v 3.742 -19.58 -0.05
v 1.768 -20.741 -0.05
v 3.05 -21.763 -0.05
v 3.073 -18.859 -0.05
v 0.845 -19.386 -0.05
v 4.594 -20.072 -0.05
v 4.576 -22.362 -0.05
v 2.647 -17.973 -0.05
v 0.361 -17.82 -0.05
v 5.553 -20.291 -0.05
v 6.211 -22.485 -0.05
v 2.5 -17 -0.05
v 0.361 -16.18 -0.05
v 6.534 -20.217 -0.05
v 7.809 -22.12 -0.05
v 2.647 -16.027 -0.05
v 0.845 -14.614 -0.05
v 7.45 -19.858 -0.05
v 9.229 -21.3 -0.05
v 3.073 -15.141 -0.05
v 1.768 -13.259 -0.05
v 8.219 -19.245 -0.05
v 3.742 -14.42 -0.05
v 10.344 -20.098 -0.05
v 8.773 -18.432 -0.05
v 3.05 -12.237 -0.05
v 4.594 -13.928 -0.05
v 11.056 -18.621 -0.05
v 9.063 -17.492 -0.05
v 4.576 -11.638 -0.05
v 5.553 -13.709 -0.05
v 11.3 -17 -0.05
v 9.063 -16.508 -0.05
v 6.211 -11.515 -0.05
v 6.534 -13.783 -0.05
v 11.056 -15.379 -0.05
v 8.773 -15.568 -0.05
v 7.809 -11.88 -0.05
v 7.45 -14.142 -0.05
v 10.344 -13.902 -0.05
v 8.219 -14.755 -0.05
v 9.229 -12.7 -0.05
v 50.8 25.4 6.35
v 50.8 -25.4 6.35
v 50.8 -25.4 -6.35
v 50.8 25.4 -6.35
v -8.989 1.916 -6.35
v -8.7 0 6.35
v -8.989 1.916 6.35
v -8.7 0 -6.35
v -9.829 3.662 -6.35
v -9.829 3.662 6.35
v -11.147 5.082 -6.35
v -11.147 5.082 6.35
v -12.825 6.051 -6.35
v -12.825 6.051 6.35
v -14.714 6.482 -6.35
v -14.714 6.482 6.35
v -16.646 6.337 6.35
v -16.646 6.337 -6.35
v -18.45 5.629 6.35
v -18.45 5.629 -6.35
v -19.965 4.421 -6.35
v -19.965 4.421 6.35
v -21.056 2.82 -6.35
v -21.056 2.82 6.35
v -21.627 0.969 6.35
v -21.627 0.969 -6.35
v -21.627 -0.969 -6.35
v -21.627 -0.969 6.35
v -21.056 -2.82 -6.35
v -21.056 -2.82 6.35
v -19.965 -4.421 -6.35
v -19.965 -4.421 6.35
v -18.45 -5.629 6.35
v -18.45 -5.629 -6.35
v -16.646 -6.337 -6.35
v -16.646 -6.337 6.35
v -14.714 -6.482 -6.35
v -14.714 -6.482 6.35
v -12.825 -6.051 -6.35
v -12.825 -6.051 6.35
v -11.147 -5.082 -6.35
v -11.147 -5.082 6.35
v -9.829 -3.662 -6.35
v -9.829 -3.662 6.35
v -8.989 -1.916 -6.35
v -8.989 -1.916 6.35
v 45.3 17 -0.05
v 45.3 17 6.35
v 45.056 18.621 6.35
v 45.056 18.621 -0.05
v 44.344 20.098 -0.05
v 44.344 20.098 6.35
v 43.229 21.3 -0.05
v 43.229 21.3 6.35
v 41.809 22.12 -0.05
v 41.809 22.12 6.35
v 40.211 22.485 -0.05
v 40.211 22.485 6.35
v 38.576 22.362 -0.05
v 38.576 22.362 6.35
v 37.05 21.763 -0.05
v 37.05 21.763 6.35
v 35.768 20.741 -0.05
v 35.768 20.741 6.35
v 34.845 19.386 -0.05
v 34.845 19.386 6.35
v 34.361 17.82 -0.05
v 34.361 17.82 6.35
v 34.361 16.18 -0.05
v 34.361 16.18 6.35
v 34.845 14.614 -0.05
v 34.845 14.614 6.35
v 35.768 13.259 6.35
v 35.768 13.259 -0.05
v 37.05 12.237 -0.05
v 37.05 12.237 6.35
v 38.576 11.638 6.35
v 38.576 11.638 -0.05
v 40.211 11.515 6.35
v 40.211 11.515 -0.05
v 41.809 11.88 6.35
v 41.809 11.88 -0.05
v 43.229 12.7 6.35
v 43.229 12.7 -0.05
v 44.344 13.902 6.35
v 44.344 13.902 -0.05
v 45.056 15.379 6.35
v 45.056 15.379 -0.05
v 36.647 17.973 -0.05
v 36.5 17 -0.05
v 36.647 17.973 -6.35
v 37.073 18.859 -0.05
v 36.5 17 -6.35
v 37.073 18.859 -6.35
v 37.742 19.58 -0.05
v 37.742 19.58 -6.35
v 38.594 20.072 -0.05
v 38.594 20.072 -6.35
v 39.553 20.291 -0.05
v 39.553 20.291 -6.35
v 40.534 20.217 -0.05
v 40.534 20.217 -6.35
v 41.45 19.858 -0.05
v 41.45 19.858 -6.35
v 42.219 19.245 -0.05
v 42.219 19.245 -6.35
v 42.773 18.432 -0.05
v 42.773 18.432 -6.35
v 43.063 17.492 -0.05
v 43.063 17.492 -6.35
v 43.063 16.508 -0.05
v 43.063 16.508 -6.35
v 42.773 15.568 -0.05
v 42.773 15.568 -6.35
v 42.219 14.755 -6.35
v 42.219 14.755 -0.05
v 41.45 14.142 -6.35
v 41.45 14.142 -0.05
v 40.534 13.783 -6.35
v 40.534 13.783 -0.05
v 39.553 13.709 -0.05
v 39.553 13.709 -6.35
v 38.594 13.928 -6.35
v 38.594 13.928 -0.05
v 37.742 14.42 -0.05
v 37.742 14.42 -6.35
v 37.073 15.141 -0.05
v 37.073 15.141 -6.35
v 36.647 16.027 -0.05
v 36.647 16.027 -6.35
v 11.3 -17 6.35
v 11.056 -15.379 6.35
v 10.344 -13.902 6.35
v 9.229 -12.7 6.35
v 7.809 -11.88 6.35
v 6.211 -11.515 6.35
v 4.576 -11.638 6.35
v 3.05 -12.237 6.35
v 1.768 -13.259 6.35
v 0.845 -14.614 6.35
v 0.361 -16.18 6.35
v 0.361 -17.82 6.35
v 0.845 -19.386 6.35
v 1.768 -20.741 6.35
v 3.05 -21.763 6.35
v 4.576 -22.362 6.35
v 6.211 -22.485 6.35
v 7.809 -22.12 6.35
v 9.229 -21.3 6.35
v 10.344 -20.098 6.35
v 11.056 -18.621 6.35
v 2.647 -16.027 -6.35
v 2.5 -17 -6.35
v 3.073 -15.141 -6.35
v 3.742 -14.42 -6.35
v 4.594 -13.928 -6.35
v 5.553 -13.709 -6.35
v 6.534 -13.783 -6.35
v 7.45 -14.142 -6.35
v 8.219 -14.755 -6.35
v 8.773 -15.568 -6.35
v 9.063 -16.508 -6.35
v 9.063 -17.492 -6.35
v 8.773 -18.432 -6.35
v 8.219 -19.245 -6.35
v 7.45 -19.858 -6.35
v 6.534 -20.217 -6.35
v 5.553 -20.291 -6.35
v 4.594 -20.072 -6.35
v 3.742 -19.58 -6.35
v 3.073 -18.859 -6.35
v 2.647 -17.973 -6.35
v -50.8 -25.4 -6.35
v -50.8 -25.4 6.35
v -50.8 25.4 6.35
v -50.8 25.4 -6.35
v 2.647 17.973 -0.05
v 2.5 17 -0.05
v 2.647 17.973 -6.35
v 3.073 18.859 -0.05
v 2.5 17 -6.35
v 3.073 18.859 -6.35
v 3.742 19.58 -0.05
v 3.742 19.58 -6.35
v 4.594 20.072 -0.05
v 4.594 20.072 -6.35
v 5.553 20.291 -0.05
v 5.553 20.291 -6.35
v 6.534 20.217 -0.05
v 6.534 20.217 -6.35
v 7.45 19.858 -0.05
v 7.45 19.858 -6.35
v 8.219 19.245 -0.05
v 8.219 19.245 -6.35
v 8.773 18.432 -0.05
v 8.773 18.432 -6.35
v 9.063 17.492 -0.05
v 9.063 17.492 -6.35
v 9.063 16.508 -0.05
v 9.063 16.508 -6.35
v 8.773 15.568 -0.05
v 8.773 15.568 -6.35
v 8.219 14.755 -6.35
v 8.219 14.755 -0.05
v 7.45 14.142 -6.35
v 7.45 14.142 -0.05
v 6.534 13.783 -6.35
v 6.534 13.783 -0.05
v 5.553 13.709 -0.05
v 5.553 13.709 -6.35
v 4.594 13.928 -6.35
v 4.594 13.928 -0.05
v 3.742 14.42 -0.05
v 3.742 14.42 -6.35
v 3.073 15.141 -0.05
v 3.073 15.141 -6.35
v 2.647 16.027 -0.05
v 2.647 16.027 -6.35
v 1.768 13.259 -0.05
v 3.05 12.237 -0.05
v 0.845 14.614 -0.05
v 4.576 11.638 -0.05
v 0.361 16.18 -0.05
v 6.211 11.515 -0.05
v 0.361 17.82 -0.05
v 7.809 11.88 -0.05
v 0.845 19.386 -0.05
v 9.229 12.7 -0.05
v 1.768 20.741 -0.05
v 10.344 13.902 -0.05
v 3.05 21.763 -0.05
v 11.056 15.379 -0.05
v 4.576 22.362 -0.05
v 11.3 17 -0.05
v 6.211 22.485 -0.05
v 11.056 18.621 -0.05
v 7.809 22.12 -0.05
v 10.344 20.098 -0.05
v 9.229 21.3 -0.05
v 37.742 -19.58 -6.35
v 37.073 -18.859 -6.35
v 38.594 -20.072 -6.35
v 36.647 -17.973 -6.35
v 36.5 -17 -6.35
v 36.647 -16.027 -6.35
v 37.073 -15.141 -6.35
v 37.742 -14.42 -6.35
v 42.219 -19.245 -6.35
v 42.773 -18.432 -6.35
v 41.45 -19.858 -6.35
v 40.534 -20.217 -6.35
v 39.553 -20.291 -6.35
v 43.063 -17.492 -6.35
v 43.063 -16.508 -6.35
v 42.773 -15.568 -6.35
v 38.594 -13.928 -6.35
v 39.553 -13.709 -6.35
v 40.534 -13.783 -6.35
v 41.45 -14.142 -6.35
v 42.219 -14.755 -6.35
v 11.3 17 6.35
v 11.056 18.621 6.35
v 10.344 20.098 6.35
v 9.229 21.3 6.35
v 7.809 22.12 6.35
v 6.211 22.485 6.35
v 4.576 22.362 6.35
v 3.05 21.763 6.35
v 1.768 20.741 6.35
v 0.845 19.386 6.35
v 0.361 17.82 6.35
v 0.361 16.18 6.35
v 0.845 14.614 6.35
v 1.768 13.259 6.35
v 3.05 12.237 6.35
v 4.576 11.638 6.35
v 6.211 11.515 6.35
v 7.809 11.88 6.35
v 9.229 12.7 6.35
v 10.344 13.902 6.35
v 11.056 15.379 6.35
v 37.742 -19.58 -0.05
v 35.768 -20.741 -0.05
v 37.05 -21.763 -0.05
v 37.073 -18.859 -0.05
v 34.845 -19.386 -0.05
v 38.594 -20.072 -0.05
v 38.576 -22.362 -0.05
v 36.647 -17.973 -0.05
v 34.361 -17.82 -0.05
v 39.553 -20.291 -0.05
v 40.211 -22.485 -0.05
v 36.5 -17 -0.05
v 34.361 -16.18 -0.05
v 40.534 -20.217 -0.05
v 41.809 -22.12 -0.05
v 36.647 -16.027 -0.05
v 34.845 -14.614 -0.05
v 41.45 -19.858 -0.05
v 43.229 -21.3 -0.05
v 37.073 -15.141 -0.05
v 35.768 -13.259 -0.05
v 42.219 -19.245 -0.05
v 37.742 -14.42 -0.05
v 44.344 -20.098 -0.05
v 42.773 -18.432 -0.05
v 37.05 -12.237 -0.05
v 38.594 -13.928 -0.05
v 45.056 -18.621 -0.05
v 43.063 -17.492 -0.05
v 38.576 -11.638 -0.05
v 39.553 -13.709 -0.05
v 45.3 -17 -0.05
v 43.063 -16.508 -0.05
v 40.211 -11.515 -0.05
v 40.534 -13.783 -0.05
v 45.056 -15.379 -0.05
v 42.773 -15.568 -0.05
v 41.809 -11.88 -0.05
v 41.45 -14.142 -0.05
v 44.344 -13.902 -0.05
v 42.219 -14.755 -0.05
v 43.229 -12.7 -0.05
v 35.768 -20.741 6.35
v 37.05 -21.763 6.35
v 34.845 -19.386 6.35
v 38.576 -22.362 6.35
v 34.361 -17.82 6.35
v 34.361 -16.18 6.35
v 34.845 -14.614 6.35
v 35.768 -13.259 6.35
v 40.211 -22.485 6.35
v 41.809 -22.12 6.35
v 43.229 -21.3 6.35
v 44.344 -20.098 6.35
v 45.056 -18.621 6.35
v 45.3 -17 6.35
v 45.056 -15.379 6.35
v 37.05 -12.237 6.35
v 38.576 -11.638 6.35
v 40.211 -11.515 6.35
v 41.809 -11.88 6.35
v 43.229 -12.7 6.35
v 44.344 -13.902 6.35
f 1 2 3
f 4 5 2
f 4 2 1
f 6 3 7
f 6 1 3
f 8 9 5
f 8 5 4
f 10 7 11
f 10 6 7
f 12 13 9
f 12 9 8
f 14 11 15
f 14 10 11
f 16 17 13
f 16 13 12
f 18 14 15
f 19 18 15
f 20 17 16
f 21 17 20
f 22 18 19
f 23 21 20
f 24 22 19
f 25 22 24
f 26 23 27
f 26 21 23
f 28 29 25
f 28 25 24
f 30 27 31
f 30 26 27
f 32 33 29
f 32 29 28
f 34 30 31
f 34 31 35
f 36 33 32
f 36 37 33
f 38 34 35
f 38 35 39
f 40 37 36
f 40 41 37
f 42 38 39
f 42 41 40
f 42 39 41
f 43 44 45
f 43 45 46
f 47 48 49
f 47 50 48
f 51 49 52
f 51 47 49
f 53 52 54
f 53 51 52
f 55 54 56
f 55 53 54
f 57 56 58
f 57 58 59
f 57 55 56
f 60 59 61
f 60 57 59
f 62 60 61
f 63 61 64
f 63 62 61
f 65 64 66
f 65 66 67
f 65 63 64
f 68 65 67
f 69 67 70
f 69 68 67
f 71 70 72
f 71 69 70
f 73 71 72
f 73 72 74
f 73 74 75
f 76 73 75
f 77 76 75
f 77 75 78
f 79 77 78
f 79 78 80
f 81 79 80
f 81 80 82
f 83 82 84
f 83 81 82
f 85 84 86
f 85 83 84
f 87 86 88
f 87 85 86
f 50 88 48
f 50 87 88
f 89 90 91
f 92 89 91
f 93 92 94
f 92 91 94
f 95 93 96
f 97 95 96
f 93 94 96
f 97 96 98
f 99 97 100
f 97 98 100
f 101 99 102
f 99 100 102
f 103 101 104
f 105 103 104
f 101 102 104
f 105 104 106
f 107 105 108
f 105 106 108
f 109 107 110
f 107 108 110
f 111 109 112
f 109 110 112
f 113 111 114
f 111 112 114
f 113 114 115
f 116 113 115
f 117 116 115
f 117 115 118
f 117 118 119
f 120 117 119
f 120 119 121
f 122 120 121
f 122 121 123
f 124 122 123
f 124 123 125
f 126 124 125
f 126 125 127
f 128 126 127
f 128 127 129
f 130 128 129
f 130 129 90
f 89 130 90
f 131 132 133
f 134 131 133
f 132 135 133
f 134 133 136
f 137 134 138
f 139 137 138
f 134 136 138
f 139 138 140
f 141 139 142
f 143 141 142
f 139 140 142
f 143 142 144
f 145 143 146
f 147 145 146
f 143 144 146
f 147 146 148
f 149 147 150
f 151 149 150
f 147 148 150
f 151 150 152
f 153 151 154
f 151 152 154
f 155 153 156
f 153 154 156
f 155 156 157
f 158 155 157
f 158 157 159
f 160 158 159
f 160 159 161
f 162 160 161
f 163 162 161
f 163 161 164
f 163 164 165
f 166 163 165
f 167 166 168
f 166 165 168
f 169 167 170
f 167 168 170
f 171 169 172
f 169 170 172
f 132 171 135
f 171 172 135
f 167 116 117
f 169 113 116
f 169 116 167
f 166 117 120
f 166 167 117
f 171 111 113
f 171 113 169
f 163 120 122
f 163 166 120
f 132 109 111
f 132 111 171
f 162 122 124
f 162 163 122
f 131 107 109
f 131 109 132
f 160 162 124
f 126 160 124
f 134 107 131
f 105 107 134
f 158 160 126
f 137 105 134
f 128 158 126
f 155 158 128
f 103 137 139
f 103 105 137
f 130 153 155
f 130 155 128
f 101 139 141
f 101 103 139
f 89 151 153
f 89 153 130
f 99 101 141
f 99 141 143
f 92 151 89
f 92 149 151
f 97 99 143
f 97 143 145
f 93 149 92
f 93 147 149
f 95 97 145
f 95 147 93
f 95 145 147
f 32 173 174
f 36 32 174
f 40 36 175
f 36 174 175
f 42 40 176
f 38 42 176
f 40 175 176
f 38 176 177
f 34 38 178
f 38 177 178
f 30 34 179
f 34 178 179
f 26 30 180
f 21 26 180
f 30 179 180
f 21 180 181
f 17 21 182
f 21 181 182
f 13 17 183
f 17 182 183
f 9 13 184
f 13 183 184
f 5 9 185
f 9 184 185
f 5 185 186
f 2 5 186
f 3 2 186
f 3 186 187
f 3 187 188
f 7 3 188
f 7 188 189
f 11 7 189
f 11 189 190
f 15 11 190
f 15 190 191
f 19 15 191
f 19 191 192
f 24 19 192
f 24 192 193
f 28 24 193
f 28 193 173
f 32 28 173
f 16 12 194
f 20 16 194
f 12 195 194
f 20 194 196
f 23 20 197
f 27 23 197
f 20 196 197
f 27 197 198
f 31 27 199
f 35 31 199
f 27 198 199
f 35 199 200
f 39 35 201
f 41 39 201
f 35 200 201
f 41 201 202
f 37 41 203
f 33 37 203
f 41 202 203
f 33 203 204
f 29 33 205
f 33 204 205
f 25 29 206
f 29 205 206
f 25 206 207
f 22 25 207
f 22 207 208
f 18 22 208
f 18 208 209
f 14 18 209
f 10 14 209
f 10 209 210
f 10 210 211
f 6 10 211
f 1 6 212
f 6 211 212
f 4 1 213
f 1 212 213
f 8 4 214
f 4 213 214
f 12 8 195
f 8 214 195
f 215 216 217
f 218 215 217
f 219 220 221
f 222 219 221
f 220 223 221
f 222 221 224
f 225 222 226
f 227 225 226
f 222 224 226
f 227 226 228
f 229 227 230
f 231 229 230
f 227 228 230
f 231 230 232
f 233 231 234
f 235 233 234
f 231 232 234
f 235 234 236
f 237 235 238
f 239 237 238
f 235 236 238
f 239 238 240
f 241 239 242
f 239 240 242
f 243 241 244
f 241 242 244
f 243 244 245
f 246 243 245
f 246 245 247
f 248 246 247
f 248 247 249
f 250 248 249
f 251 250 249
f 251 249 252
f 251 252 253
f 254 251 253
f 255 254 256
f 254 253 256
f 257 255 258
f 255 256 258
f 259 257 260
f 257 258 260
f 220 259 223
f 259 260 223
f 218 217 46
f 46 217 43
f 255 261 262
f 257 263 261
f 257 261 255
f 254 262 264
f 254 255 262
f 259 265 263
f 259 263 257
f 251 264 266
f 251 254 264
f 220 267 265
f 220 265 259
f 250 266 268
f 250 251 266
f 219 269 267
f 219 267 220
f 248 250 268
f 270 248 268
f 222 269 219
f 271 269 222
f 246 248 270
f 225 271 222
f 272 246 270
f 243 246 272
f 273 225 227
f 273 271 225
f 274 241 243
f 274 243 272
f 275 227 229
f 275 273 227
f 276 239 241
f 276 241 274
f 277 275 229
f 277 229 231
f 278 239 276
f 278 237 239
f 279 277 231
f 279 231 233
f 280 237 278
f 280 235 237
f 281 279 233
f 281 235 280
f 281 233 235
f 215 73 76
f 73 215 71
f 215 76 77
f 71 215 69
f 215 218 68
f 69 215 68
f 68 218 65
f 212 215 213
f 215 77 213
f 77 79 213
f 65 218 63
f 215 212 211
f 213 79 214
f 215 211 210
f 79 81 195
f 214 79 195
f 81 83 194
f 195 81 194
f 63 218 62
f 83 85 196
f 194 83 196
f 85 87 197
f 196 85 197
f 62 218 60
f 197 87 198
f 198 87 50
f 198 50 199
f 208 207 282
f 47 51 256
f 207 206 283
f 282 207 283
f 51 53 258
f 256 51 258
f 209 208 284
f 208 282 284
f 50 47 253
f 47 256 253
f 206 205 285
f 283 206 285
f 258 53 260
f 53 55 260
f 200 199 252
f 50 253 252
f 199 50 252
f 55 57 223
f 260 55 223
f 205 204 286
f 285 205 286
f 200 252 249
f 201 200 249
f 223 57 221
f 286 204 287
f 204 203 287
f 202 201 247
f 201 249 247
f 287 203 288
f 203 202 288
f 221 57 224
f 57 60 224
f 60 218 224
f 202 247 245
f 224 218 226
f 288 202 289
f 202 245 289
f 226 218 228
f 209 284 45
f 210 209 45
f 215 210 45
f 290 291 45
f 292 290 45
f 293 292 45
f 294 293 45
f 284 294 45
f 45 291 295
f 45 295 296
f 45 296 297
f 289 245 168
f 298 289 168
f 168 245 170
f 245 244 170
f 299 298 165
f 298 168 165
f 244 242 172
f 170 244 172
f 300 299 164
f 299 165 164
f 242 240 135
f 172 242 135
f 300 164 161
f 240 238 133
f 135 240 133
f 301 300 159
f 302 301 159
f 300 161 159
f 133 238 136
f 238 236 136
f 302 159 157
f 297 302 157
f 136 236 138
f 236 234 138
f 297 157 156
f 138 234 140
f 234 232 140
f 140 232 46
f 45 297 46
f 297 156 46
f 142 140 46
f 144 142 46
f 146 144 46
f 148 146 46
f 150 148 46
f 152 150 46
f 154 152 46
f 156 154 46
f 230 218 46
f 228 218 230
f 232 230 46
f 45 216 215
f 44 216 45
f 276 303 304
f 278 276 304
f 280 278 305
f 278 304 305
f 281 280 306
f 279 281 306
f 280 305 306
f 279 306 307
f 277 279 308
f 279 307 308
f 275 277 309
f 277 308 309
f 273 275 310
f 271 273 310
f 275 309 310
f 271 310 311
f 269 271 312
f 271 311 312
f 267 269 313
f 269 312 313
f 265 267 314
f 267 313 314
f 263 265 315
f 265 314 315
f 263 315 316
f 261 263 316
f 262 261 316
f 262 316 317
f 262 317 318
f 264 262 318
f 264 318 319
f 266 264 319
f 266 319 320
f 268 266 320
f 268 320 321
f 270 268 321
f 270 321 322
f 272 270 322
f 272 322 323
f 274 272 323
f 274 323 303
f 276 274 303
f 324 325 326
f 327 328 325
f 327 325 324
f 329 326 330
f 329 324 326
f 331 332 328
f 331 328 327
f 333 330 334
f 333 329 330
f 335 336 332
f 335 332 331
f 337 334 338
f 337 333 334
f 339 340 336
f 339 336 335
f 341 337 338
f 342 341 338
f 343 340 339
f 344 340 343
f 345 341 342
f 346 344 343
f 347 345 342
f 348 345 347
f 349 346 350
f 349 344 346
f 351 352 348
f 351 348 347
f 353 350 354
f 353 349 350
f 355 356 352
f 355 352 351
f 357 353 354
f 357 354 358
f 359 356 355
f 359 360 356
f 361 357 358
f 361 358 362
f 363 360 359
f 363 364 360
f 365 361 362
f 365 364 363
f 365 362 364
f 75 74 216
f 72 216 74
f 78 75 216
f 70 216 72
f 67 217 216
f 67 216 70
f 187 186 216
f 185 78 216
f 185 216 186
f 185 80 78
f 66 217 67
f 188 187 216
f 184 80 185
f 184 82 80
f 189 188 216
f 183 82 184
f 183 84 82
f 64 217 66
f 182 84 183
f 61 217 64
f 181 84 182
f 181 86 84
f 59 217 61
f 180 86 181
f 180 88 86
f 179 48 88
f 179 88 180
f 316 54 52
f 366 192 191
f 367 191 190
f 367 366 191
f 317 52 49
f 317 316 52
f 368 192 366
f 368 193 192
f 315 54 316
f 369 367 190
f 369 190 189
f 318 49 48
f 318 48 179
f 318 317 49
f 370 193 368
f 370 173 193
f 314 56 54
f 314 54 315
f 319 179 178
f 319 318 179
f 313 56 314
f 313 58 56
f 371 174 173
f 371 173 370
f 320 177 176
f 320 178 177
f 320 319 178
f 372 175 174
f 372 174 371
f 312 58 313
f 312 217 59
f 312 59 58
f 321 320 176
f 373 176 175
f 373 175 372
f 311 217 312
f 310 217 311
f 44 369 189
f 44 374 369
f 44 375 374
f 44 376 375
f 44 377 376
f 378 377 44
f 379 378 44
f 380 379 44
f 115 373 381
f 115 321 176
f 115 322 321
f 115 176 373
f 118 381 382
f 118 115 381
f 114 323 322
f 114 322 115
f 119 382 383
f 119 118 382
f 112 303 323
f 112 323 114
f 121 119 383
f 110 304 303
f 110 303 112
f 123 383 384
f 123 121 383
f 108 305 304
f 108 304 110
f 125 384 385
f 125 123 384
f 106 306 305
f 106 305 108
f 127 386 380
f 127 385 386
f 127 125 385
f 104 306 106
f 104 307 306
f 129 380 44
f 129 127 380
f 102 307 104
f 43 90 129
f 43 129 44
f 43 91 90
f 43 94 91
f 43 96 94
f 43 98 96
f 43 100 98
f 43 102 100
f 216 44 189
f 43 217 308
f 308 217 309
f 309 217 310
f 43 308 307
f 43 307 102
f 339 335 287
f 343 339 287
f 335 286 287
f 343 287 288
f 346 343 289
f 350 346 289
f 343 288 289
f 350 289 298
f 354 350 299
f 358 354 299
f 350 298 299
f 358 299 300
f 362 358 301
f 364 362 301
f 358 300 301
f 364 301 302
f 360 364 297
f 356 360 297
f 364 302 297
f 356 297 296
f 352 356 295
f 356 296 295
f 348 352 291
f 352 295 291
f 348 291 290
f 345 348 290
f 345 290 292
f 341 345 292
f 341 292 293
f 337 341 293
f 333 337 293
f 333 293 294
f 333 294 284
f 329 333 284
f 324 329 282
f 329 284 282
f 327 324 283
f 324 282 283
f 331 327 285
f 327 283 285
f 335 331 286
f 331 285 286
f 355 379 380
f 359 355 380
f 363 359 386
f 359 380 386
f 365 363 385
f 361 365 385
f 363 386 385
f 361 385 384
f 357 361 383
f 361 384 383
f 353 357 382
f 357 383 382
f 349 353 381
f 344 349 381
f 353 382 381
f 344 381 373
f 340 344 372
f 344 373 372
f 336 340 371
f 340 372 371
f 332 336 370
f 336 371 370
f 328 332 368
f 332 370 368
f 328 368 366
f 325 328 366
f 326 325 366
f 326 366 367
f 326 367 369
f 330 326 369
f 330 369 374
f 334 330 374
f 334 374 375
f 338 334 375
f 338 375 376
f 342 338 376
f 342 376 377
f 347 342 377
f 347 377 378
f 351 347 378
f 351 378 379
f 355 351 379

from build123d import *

# Parameters (mm, degrees)
CROQUIS1_W                                           = 101.6
CROQUIS1_H                                           = 50.8
CROQUIS1_R                                           = 6.5
SALIENTE_EXTRUIR1_DEPTH                              = 6.35
REFRENTADO_PARA_TORNILLO_CON_CABEZA_HUEC_D           = 6.6
REFRENTADO_PARA_TORNILLO_CON_CABEZA_HUEC_CBORE_D     = 11
REFRENTADO_PARA_TORNILLO_CON_CABEZA_HUEC_CBORE_DEPTH = 6.4


with BuildPart() as part:
    # Croquis1 → Saliente-Extruir1 (new, symmetric)
    with BuildSketch(Plane.XY):
        Rectangle(CROQUIS1_W, CROQUIS1_H)
        with Locations((-15.2, 0)):
            Circle(CROQUIS1_R, mode=Mode.SUBTRACT)
    extrude(amount=SALIENTE_EXTRUIR1_DEPTH, both=True)

    # Refrentado para tornillo con cabeza hueca de M61 (through all)
    with Locations(Plane.XY.offset(6.35)):
        with Locations((5.8, 17), (39.8, 17), (39.8, -17), (5.8, -17)):
            CounterBoreHole(REFRENTADO_PARA_TORNILLO_CON_CABEZA_HUEC_D / 2, REFRENTADO_PARA_TORNILLO_CON_CABEZA_HUEC_CBORE_D / 2, REFRENTADO_PARA_TORNILLO_CON_CABEZA_HUEC_CBORE_DEPTH)


solid = part.part
